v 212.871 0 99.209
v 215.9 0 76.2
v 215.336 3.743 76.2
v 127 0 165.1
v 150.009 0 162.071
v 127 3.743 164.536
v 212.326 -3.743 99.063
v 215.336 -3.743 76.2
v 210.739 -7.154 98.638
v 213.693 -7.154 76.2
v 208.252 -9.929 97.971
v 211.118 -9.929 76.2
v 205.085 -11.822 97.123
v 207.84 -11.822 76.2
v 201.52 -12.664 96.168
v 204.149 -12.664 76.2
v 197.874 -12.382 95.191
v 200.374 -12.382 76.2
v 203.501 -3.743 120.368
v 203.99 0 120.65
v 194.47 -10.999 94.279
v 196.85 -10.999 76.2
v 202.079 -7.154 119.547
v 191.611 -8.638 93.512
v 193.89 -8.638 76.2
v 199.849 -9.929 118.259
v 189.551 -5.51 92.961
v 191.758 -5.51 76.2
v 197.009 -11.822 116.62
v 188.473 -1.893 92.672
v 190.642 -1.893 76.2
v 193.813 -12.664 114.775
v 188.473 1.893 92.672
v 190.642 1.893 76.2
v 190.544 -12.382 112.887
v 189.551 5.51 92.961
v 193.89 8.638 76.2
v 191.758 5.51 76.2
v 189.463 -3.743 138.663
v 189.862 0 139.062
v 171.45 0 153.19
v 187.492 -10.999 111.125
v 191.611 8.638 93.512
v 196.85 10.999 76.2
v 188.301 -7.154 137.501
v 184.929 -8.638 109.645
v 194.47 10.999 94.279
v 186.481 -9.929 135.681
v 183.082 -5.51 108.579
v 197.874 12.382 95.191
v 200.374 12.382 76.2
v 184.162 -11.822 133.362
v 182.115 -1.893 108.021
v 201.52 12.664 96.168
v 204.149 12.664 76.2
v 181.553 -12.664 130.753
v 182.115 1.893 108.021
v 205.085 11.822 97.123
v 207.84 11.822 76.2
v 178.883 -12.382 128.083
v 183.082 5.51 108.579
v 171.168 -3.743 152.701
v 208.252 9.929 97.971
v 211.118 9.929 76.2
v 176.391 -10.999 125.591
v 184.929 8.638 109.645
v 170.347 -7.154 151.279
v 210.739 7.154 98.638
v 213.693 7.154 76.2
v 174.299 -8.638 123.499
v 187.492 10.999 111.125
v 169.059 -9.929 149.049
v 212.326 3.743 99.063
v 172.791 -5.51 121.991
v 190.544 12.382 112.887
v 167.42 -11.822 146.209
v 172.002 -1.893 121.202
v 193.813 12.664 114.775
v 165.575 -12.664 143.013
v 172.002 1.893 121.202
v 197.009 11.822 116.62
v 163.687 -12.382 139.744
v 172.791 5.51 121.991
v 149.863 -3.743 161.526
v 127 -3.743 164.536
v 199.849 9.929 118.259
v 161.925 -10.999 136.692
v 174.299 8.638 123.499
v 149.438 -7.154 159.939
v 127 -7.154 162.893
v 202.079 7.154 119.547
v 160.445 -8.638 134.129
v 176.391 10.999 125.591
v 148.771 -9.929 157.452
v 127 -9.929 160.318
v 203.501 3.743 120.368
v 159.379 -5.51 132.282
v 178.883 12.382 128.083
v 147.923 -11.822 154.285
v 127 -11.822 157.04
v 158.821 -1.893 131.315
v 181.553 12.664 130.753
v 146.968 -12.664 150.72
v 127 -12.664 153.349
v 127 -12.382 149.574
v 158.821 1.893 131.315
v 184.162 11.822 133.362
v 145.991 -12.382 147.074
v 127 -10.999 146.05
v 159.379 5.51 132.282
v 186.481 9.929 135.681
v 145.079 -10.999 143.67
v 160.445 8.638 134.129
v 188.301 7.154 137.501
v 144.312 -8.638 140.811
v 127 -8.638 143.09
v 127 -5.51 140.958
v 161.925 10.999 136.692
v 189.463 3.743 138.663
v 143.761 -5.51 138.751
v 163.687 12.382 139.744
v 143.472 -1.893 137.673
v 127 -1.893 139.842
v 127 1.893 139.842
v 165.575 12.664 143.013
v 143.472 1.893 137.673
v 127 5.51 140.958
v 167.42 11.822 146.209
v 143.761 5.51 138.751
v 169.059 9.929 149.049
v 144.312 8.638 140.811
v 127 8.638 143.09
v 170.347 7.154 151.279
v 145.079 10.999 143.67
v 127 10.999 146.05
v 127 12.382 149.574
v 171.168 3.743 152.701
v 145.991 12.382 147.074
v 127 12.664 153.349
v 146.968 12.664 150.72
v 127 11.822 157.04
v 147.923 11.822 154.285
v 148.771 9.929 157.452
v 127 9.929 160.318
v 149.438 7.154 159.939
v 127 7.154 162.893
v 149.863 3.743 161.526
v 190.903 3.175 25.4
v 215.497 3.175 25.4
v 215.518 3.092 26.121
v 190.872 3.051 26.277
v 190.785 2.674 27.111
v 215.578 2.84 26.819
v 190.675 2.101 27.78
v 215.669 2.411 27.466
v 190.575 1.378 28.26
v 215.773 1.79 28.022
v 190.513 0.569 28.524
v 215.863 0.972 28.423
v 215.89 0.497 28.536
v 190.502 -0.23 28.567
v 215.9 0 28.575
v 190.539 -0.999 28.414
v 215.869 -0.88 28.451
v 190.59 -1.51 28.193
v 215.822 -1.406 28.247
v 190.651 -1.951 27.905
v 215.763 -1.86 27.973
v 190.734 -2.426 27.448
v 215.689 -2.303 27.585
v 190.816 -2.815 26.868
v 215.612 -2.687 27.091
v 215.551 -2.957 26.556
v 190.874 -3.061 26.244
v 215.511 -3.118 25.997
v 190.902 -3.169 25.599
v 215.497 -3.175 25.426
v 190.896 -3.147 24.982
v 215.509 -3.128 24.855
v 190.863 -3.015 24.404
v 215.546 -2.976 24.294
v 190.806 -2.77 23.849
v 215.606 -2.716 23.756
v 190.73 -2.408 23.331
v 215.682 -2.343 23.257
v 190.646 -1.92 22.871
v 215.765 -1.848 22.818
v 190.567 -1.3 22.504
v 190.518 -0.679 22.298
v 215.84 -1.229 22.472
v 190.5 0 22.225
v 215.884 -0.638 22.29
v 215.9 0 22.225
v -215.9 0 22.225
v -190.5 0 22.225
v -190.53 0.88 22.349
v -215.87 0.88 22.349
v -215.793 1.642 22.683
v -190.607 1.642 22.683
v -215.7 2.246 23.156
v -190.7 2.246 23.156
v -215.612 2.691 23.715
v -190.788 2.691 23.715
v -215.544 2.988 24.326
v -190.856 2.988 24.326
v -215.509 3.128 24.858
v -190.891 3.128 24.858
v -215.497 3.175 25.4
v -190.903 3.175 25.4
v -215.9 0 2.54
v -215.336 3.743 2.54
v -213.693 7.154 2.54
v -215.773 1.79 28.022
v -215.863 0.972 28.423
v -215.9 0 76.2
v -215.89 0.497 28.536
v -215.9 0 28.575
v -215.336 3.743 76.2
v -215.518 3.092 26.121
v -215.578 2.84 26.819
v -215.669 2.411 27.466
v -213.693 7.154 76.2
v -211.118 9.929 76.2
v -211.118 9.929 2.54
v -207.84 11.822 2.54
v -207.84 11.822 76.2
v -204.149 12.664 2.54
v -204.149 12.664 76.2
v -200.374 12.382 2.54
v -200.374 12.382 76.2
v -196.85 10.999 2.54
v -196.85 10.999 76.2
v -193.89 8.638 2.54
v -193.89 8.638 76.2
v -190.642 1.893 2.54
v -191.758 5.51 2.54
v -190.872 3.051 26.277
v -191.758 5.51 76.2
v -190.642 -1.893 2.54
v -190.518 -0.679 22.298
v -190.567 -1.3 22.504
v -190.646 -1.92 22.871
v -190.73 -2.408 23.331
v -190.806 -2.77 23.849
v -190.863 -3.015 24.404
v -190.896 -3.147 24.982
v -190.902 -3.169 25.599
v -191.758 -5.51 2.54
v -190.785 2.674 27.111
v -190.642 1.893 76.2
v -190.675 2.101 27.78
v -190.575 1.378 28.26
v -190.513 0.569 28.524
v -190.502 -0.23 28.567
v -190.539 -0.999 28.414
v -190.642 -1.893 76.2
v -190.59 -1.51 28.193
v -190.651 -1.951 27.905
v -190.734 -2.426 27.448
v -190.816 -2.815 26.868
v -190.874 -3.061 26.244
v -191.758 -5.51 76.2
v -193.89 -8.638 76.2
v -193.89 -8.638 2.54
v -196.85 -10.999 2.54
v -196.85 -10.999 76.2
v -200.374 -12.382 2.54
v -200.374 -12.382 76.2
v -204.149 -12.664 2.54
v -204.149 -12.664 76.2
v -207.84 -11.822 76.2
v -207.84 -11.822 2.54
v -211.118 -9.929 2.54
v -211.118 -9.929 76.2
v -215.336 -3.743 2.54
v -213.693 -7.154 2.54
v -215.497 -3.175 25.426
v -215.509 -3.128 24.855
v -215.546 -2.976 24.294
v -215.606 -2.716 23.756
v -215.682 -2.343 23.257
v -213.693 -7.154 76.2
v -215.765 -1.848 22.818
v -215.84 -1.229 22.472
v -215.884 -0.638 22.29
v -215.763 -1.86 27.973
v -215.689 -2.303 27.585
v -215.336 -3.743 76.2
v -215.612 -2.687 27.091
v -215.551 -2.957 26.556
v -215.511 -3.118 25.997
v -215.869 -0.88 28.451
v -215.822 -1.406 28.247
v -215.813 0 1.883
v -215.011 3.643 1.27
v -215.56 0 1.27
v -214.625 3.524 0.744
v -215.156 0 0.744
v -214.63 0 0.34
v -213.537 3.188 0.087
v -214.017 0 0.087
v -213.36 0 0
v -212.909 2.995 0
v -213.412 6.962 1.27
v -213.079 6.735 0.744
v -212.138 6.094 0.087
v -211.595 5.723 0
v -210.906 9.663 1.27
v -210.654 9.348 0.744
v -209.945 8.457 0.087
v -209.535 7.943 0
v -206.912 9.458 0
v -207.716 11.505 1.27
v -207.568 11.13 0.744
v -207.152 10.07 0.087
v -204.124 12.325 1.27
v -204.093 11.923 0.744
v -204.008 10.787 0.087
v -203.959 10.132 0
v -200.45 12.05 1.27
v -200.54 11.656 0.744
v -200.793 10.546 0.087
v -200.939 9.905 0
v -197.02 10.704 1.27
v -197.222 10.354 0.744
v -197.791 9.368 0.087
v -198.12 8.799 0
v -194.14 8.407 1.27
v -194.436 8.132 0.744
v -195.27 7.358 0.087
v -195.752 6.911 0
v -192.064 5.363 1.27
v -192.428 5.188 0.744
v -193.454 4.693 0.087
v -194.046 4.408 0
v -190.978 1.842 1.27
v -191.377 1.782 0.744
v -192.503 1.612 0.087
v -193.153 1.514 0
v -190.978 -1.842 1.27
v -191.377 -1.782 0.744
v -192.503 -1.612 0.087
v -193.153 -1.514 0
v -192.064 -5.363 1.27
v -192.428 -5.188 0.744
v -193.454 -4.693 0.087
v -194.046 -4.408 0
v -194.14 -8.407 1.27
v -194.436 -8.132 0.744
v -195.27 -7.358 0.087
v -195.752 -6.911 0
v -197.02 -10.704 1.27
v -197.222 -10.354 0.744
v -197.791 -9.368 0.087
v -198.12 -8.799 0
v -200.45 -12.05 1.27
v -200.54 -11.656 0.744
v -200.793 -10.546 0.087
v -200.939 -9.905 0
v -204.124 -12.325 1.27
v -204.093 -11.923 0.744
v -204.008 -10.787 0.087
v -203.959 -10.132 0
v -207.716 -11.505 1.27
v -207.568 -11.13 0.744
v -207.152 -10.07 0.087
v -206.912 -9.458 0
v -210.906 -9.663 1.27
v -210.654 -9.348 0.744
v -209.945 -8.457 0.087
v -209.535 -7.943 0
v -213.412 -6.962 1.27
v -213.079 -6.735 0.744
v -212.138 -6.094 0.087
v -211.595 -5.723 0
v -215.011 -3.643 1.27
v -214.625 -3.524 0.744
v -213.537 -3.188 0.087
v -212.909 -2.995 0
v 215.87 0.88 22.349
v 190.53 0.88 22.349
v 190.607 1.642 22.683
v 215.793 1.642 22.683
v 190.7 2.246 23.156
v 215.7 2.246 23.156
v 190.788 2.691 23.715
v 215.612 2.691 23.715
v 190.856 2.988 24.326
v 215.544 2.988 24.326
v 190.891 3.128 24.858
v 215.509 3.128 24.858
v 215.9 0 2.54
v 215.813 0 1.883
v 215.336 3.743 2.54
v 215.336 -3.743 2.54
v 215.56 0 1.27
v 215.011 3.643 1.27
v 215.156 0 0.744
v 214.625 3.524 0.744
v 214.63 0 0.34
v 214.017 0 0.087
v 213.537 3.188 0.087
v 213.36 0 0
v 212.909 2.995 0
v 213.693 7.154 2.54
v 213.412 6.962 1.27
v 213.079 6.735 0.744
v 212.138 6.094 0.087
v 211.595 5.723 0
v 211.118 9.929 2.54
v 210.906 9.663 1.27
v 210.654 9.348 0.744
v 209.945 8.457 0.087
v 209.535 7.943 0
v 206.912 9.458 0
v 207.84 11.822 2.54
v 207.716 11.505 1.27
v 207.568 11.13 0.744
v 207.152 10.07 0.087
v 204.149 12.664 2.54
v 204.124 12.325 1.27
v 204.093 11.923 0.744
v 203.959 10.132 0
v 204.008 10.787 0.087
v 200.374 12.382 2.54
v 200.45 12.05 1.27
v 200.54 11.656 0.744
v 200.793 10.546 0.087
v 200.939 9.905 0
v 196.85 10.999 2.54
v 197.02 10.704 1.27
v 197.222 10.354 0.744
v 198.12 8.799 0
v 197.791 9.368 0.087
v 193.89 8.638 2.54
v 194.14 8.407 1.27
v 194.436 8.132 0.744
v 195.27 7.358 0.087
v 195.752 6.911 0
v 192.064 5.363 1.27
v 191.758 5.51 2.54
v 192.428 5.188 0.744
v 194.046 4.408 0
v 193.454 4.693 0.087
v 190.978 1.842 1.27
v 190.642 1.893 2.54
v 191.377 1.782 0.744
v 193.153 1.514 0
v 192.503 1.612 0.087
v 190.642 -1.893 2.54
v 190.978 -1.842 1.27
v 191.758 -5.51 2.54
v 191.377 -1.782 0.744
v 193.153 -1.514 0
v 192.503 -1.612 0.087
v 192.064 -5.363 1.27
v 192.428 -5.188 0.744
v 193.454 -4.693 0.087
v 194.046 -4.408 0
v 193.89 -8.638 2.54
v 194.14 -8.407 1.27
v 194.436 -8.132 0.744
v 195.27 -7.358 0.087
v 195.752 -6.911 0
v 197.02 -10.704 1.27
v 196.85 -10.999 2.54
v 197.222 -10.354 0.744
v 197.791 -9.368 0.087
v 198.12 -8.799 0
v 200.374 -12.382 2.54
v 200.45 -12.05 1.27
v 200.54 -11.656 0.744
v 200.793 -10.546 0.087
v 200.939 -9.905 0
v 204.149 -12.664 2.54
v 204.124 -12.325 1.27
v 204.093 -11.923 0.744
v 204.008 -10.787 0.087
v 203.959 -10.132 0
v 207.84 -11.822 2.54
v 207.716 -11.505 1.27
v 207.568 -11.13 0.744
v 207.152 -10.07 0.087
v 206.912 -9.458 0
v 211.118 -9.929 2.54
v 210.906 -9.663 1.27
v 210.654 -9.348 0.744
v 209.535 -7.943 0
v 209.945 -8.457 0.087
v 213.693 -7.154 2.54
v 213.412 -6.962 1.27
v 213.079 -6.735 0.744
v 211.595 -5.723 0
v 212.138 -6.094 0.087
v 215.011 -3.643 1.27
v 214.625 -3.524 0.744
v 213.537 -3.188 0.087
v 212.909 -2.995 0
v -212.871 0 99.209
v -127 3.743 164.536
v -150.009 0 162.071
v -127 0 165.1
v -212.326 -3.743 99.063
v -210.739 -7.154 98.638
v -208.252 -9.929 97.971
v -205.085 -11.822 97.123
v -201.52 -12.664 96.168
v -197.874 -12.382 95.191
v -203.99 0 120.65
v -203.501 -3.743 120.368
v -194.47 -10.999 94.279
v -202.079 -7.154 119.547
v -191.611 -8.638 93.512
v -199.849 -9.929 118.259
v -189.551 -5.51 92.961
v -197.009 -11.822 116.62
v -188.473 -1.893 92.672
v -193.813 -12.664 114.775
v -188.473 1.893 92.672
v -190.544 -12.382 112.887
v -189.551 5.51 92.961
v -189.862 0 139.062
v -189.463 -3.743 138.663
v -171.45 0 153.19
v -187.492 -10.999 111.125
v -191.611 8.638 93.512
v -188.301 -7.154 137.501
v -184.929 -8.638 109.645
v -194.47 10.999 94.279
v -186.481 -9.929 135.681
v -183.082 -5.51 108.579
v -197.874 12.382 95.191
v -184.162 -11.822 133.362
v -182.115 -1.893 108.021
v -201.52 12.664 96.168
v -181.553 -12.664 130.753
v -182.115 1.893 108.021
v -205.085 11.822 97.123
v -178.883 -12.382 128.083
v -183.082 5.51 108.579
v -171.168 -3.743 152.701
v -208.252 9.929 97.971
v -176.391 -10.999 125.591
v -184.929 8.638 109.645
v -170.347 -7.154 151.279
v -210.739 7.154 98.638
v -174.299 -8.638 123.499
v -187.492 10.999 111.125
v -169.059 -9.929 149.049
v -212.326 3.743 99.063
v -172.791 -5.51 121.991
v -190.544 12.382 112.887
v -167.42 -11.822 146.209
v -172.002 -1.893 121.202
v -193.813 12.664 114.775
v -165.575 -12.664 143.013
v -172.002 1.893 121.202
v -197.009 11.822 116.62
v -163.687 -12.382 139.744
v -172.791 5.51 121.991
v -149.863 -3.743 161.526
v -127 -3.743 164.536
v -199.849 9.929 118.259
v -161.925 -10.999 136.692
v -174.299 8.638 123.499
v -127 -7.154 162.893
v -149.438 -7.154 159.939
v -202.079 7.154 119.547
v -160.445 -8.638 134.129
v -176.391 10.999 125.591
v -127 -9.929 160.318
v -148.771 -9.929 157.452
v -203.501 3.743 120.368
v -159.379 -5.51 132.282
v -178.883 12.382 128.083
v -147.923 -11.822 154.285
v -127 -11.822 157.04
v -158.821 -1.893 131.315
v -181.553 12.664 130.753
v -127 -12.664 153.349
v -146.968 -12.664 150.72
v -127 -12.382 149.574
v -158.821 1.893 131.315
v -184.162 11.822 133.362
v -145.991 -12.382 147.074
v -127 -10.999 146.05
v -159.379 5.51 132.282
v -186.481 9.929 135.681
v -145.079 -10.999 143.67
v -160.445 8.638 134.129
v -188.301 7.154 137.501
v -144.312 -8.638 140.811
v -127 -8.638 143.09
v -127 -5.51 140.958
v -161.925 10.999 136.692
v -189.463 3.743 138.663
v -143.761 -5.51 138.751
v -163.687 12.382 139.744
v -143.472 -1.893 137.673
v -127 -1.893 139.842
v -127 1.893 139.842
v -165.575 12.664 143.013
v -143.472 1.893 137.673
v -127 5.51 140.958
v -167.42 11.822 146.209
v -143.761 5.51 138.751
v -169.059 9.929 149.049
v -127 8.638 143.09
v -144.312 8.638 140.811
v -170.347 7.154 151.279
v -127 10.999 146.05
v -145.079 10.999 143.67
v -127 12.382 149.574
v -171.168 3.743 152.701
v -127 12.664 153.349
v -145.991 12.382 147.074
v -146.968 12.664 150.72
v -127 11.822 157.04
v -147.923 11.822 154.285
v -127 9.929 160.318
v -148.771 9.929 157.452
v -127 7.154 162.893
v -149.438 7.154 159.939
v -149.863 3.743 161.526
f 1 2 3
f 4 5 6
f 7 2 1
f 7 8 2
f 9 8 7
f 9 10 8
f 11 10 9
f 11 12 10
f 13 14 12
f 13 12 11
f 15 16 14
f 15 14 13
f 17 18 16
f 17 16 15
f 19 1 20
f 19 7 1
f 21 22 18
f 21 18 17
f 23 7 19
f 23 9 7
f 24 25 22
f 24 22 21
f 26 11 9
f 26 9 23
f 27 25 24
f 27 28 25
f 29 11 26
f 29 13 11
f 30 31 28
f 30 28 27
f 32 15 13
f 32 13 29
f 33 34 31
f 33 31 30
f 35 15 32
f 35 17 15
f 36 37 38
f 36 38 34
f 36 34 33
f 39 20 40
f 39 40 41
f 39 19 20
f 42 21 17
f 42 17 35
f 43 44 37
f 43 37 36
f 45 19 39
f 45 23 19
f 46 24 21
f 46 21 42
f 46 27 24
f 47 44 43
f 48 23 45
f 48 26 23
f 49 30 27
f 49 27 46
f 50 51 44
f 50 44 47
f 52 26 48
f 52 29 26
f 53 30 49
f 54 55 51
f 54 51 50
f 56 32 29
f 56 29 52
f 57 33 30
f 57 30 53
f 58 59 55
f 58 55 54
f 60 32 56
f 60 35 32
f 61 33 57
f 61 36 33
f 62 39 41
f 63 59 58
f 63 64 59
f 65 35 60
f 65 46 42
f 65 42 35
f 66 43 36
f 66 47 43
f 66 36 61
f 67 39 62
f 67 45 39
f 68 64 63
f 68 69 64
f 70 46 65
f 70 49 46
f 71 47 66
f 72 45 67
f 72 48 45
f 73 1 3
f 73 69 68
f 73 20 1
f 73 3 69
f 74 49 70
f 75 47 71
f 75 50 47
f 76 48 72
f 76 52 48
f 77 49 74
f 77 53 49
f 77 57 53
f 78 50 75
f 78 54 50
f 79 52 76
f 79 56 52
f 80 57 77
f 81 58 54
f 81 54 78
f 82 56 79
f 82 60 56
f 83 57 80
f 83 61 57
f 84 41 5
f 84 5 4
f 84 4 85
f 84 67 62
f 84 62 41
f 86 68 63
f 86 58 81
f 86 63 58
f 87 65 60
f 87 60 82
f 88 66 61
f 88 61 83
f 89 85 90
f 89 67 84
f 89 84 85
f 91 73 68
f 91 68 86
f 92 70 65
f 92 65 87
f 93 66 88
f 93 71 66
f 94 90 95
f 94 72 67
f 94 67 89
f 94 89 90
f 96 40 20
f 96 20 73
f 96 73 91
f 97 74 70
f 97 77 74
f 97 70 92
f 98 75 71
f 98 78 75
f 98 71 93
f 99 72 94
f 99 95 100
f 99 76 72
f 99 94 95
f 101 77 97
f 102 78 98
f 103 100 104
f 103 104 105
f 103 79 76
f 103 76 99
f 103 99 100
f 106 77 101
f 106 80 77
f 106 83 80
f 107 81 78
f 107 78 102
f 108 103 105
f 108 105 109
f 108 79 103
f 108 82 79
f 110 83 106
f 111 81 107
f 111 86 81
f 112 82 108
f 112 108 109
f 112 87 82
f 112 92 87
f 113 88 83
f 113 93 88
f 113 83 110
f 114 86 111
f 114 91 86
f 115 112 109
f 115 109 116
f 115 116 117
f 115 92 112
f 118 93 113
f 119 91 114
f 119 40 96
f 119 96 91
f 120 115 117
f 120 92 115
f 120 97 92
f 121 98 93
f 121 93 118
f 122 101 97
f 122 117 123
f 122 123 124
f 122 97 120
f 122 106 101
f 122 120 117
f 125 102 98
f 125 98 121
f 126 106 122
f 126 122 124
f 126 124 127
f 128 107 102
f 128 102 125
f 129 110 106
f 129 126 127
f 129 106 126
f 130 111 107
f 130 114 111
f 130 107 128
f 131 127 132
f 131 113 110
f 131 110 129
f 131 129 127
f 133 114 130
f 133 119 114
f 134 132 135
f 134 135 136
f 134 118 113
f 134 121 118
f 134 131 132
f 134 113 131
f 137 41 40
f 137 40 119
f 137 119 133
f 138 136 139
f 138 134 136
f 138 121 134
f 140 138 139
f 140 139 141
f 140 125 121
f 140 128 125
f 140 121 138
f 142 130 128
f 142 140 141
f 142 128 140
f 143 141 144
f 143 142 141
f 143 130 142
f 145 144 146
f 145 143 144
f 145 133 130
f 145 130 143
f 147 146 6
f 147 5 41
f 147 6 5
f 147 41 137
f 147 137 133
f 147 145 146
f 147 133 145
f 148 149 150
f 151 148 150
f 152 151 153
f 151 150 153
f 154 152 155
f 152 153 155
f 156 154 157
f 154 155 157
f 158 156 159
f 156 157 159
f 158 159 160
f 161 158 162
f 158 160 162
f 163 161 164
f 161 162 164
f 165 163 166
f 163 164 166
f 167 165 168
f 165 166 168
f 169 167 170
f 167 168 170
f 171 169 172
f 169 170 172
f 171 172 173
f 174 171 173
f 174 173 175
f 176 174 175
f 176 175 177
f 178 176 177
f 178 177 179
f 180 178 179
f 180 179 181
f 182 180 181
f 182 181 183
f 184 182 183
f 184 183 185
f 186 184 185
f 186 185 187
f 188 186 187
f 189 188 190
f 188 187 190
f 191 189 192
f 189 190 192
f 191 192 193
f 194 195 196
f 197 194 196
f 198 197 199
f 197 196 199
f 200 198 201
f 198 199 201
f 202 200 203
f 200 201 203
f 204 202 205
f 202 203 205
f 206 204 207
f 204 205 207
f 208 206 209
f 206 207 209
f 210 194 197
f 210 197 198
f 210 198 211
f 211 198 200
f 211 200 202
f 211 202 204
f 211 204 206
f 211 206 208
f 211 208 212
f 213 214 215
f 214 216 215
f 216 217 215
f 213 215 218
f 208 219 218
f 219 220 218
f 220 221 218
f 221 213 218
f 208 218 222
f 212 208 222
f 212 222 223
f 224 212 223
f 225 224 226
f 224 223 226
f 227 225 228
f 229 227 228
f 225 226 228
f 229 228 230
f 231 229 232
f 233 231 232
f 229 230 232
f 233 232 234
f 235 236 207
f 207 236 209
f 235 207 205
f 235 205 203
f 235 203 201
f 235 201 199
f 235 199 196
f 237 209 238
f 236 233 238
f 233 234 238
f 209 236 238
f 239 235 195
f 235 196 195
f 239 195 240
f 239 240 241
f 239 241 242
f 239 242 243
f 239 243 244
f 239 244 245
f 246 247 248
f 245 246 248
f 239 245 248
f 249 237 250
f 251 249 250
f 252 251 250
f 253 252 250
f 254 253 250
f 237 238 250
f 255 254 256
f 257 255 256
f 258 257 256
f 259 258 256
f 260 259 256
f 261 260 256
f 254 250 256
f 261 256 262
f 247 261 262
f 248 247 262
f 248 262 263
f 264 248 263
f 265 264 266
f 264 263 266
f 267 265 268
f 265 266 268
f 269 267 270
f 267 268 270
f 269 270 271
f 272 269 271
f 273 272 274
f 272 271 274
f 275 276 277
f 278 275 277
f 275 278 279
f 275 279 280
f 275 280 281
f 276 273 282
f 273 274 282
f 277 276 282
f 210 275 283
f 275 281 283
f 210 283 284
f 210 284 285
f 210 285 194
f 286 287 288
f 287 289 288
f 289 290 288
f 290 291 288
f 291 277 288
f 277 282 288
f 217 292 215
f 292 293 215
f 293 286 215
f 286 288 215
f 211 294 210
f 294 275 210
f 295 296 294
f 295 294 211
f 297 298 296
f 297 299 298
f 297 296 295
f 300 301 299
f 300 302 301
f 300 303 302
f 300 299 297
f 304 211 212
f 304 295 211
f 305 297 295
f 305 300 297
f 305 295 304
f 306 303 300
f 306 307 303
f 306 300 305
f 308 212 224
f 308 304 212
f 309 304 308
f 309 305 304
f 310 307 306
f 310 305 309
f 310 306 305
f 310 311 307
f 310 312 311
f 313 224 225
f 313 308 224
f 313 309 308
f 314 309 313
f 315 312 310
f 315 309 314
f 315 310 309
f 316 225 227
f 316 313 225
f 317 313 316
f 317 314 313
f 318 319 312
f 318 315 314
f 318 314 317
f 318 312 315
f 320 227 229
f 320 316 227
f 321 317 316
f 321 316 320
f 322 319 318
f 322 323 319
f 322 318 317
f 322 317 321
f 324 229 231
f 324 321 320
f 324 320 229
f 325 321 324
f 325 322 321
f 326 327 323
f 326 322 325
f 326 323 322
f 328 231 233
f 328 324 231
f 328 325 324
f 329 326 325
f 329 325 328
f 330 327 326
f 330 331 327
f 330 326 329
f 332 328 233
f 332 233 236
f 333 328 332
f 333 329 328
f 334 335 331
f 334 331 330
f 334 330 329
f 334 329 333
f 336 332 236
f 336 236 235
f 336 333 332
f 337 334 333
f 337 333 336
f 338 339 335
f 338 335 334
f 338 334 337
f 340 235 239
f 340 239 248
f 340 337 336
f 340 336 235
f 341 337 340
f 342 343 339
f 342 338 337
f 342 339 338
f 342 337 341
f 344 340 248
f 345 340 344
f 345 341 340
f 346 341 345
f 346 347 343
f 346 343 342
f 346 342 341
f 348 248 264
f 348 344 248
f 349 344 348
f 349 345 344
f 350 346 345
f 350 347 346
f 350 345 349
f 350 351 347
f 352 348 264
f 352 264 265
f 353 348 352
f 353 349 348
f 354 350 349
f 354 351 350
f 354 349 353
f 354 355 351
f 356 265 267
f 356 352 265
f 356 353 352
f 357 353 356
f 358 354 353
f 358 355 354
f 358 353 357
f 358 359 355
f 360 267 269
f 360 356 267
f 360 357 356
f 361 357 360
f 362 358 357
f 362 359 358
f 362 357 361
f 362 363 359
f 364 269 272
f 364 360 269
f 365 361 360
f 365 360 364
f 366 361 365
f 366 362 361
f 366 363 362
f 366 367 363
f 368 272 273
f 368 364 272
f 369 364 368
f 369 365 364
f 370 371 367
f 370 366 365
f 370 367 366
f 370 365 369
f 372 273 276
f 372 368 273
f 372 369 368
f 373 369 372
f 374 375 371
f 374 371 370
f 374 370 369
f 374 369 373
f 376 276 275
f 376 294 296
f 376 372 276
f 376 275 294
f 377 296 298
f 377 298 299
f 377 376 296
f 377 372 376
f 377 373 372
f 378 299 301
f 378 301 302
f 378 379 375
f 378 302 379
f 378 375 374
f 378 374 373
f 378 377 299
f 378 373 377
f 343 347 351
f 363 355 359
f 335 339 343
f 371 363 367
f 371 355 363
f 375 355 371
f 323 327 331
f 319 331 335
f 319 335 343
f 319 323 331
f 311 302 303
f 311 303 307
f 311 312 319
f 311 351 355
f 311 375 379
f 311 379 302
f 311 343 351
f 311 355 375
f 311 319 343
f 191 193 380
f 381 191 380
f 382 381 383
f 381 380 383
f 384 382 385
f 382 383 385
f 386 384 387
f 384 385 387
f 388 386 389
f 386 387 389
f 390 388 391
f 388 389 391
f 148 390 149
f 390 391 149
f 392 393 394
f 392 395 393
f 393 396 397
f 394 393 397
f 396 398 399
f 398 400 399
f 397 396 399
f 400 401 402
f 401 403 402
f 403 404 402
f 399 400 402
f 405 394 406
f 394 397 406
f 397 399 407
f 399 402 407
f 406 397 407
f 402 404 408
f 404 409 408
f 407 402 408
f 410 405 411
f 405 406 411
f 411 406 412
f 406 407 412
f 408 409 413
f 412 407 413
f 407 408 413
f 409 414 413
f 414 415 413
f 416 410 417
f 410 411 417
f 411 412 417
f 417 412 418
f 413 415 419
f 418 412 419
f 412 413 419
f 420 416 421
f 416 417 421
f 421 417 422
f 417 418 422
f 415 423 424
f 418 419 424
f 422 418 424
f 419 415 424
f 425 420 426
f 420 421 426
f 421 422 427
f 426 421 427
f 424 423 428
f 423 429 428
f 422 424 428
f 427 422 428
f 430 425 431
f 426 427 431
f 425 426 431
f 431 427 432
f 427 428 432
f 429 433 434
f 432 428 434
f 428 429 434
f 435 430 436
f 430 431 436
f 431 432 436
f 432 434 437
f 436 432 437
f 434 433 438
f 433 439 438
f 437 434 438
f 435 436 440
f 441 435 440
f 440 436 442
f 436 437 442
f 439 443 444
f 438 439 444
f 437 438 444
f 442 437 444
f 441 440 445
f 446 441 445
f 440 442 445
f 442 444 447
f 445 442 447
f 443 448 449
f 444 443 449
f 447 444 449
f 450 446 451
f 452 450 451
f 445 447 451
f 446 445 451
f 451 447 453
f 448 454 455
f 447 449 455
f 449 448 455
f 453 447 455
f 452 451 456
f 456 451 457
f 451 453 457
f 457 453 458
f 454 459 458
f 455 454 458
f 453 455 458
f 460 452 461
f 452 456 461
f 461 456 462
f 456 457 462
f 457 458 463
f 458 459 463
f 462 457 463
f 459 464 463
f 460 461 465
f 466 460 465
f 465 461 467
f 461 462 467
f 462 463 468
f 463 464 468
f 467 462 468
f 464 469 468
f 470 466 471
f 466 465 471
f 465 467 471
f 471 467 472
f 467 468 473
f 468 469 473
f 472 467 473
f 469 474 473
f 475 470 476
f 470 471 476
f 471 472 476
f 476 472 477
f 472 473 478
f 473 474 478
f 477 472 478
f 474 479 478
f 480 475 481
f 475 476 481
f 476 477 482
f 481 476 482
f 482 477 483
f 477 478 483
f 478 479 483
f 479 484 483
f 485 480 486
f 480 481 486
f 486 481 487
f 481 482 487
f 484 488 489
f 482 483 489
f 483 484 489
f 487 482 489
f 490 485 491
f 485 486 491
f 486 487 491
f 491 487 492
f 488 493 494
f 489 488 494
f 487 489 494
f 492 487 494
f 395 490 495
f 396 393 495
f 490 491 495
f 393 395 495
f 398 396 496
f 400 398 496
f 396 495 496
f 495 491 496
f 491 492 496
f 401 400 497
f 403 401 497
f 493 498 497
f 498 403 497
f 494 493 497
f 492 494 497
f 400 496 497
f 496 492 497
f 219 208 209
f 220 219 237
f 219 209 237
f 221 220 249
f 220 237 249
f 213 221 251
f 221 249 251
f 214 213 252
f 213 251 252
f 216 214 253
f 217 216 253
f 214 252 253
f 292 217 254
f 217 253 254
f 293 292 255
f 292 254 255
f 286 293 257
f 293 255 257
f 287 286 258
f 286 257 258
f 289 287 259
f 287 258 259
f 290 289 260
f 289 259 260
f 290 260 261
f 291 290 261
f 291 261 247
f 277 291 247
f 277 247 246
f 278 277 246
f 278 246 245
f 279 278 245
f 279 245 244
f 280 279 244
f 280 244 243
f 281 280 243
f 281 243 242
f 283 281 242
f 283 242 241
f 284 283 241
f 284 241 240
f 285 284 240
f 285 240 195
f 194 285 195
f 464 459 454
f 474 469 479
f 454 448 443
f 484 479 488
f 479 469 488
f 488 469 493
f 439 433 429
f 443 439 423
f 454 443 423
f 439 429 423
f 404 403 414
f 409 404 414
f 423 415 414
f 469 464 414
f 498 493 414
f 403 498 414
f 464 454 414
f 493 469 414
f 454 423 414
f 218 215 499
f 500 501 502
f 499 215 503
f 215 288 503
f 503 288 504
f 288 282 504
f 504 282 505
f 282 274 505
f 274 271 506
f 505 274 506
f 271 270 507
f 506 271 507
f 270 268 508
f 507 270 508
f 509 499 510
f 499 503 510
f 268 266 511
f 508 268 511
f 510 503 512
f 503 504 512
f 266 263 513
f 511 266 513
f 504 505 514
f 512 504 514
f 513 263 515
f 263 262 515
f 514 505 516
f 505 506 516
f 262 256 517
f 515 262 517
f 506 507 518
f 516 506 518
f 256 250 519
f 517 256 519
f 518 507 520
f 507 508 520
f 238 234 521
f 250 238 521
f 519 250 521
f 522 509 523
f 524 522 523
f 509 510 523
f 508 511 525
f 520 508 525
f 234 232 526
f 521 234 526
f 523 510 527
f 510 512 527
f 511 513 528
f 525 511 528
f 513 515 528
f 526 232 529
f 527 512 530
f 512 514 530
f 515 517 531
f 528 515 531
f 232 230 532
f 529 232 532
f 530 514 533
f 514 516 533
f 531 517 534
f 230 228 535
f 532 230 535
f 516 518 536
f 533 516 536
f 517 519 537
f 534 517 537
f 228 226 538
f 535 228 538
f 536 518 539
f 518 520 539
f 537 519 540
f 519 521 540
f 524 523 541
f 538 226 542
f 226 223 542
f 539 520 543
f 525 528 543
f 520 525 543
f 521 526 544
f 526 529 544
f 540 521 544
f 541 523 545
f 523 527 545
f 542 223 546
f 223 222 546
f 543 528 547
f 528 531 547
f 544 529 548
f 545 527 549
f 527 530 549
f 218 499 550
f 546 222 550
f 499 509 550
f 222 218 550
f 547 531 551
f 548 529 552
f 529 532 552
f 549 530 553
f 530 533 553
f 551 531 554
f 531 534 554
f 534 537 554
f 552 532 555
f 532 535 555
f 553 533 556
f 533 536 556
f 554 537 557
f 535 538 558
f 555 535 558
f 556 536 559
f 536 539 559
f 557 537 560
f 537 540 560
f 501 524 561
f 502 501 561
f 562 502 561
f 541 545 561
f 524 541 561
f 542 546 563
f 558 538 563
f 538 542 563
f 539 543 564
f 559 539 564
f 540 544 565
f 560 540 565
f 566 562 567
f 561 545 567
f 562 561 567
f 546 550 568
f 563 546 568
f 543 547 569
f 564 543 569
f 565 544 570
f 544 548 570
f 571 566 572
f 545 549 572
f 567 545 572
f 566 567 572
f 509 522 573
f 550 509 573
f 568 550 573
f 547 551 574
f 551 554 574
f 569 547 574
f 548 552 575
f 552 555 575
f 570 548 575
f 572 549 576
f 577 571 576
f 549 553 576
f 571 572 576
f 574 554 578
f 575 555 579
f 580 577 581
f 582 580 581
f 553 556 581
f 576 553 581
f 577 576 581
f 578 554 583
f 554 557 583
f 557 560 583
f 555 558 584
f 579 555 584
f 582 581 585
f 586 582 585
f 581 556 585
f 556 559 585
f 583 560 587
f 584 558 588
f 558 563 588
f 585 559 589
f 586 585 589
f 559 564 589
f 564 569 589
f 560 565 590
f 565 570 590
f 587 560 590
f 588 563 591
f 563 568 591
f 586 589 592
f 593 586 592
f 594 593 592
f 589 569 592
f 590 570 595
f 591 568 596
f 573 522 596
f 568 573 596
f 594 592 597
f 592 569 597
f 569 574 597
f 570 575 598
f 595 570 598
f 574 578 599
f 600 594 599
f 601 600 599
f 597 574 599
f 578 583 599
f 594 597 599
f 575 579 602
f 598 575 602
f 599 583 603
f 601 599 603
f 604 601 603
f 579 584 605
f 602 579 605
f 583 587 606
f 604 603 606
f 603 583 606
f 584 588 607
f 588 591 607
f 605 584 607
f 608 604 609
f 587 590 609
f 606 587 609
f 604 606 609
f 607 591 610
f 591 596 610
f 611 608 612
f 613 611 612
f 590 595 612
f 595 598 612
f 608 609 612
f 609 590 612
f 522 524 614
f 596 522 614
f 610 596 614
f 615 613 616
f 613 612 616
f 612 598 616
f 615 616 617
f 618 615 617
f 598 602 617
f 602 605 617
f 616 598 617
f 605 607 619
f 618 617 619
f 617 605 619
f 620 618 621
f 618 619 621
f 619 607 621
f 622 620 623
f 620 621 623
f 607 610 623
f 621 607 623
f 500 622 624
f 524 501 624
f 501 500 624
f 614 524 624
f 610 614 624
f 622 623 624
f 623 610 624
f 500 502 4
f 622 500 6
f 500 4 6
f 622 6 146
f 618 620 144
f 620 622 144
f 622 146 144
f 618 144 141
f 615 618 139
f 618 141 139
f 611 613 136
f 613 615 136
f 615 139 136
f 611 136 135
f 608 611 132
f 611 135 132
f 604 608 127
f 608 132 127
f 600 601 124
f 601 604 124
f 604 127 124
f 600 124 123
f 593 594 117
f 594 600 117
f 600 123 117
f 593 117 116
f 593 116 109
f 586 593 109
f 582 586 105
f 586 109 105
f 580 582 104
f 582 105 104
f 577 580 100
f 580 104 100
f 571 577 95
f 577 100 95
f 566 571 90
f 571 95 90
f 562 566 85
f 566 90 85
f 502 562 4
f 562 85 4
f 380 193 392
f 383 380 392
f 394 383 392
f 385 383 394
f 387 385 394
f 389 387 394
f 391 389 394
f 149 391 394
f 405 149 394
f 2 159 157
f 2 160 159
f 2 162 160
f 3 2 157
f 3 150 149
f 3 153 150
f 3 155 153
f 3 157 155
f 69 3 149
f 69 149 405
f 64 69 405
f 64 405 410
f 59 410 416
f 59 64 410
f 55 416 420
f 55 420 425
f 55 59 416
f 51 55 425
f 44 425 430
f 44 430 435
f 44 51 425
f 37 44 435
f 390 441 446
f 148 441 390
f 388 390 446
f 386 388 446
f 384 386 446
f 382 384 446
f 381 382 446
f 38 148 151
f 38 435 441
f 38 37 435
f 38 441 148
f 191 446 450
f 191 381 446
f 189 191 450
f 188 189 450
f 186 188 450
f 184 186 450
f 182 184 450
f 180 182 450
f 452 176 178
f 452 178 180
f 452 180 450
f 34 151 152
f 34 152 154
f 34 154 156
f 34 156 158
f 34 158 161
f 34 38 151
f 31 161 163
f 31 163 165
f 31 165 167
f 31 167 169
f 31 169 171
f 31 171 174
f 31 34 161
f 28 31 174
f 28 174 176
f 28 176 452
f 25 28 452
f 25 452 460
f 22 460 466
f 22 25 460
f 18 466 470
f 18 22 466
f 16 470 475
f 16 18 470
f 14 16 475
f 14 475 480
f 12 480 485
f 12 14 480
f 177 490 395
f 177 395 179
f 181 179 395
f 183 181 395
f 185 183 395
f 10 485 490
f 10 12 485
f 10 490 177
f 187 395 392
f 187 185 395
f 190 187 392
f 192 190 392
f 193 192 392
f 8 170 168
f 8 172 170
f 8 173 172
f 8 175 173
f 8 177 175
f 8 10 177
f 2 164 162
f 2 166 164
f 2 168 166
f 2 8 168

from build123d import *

# Parameters (mm, degrees)
F4_R      = 2.54
F8_DEPTH  = 450.088
F10_DEPTH = 6.35


with BuildPart() as f2:
    # F2: sweep along a path in F0
    with BuildLine(Plane.XZ) as f2_path:
        Line((203.2, 0), (203.2, 76.2))
        ThreePointArc((203.2, 76.2), (180.8815367264, 130.0815367264), (127, 152.4))
        Line((127, 152.4), (0, 152.4))
    # F1 (on Top) → F2 (sweep)
    with BuildSketch(Plane.XY):
        with BuildLine():
            ThreePointArc((190.5, 0), (203.2, -12.7), (215.9, 0))
            ThreePointArc((215.9, 0), (203.2, 12.7), (190.5, 0))
        make_face()
    sweep(path=f2_path.line)

    # F3: F2 across plane


with BuildPart() as f2_1:
    add(f2.part)
    add(f2.part.mirror(Plane.YZ))

    # F4
    f4_edges = [f2_1.edges().sort_by_distance(p)[0] for p in [
        (190.5, 0, 0),
        (-190.5, 0, 0),
    ]]
    fillet(f4_edges, radius=F4_R)

    # F7 (on offset) → F8 (cut)
    with BuildSketch(Plane.YZ.offset(215.9)):
        with BuildLine():
            ThreePointArc((0, 22.225), (2.2450640303, 23.1549359697), (3.175, 25.4))
            ThreePointArc((3.175, 25.4), (-2.2450640303, 27.6450640303), (0, 22.225))
        make_face()
    extrude(amount=-F8_DEPTH, mode=Mode.SUBTRACT)

    # F9 (on offset) → F10 (cut)
    with BuildSketch(Plane.YZ.offset(-215.9)):
        with BuildLine():
            ThreePointArc((0, 22.225), (2.2450640303, 23.1549359697), (3.175, 25.4))
            ThreePointArc((3.175, 25.4), (-2.2450640303, 27.6450640303), (0, 22.225))
        make_face()
    extrude(amount=F10_DEPTH, mode=Mode.SUBTRACT)


solid = f2_1.part
